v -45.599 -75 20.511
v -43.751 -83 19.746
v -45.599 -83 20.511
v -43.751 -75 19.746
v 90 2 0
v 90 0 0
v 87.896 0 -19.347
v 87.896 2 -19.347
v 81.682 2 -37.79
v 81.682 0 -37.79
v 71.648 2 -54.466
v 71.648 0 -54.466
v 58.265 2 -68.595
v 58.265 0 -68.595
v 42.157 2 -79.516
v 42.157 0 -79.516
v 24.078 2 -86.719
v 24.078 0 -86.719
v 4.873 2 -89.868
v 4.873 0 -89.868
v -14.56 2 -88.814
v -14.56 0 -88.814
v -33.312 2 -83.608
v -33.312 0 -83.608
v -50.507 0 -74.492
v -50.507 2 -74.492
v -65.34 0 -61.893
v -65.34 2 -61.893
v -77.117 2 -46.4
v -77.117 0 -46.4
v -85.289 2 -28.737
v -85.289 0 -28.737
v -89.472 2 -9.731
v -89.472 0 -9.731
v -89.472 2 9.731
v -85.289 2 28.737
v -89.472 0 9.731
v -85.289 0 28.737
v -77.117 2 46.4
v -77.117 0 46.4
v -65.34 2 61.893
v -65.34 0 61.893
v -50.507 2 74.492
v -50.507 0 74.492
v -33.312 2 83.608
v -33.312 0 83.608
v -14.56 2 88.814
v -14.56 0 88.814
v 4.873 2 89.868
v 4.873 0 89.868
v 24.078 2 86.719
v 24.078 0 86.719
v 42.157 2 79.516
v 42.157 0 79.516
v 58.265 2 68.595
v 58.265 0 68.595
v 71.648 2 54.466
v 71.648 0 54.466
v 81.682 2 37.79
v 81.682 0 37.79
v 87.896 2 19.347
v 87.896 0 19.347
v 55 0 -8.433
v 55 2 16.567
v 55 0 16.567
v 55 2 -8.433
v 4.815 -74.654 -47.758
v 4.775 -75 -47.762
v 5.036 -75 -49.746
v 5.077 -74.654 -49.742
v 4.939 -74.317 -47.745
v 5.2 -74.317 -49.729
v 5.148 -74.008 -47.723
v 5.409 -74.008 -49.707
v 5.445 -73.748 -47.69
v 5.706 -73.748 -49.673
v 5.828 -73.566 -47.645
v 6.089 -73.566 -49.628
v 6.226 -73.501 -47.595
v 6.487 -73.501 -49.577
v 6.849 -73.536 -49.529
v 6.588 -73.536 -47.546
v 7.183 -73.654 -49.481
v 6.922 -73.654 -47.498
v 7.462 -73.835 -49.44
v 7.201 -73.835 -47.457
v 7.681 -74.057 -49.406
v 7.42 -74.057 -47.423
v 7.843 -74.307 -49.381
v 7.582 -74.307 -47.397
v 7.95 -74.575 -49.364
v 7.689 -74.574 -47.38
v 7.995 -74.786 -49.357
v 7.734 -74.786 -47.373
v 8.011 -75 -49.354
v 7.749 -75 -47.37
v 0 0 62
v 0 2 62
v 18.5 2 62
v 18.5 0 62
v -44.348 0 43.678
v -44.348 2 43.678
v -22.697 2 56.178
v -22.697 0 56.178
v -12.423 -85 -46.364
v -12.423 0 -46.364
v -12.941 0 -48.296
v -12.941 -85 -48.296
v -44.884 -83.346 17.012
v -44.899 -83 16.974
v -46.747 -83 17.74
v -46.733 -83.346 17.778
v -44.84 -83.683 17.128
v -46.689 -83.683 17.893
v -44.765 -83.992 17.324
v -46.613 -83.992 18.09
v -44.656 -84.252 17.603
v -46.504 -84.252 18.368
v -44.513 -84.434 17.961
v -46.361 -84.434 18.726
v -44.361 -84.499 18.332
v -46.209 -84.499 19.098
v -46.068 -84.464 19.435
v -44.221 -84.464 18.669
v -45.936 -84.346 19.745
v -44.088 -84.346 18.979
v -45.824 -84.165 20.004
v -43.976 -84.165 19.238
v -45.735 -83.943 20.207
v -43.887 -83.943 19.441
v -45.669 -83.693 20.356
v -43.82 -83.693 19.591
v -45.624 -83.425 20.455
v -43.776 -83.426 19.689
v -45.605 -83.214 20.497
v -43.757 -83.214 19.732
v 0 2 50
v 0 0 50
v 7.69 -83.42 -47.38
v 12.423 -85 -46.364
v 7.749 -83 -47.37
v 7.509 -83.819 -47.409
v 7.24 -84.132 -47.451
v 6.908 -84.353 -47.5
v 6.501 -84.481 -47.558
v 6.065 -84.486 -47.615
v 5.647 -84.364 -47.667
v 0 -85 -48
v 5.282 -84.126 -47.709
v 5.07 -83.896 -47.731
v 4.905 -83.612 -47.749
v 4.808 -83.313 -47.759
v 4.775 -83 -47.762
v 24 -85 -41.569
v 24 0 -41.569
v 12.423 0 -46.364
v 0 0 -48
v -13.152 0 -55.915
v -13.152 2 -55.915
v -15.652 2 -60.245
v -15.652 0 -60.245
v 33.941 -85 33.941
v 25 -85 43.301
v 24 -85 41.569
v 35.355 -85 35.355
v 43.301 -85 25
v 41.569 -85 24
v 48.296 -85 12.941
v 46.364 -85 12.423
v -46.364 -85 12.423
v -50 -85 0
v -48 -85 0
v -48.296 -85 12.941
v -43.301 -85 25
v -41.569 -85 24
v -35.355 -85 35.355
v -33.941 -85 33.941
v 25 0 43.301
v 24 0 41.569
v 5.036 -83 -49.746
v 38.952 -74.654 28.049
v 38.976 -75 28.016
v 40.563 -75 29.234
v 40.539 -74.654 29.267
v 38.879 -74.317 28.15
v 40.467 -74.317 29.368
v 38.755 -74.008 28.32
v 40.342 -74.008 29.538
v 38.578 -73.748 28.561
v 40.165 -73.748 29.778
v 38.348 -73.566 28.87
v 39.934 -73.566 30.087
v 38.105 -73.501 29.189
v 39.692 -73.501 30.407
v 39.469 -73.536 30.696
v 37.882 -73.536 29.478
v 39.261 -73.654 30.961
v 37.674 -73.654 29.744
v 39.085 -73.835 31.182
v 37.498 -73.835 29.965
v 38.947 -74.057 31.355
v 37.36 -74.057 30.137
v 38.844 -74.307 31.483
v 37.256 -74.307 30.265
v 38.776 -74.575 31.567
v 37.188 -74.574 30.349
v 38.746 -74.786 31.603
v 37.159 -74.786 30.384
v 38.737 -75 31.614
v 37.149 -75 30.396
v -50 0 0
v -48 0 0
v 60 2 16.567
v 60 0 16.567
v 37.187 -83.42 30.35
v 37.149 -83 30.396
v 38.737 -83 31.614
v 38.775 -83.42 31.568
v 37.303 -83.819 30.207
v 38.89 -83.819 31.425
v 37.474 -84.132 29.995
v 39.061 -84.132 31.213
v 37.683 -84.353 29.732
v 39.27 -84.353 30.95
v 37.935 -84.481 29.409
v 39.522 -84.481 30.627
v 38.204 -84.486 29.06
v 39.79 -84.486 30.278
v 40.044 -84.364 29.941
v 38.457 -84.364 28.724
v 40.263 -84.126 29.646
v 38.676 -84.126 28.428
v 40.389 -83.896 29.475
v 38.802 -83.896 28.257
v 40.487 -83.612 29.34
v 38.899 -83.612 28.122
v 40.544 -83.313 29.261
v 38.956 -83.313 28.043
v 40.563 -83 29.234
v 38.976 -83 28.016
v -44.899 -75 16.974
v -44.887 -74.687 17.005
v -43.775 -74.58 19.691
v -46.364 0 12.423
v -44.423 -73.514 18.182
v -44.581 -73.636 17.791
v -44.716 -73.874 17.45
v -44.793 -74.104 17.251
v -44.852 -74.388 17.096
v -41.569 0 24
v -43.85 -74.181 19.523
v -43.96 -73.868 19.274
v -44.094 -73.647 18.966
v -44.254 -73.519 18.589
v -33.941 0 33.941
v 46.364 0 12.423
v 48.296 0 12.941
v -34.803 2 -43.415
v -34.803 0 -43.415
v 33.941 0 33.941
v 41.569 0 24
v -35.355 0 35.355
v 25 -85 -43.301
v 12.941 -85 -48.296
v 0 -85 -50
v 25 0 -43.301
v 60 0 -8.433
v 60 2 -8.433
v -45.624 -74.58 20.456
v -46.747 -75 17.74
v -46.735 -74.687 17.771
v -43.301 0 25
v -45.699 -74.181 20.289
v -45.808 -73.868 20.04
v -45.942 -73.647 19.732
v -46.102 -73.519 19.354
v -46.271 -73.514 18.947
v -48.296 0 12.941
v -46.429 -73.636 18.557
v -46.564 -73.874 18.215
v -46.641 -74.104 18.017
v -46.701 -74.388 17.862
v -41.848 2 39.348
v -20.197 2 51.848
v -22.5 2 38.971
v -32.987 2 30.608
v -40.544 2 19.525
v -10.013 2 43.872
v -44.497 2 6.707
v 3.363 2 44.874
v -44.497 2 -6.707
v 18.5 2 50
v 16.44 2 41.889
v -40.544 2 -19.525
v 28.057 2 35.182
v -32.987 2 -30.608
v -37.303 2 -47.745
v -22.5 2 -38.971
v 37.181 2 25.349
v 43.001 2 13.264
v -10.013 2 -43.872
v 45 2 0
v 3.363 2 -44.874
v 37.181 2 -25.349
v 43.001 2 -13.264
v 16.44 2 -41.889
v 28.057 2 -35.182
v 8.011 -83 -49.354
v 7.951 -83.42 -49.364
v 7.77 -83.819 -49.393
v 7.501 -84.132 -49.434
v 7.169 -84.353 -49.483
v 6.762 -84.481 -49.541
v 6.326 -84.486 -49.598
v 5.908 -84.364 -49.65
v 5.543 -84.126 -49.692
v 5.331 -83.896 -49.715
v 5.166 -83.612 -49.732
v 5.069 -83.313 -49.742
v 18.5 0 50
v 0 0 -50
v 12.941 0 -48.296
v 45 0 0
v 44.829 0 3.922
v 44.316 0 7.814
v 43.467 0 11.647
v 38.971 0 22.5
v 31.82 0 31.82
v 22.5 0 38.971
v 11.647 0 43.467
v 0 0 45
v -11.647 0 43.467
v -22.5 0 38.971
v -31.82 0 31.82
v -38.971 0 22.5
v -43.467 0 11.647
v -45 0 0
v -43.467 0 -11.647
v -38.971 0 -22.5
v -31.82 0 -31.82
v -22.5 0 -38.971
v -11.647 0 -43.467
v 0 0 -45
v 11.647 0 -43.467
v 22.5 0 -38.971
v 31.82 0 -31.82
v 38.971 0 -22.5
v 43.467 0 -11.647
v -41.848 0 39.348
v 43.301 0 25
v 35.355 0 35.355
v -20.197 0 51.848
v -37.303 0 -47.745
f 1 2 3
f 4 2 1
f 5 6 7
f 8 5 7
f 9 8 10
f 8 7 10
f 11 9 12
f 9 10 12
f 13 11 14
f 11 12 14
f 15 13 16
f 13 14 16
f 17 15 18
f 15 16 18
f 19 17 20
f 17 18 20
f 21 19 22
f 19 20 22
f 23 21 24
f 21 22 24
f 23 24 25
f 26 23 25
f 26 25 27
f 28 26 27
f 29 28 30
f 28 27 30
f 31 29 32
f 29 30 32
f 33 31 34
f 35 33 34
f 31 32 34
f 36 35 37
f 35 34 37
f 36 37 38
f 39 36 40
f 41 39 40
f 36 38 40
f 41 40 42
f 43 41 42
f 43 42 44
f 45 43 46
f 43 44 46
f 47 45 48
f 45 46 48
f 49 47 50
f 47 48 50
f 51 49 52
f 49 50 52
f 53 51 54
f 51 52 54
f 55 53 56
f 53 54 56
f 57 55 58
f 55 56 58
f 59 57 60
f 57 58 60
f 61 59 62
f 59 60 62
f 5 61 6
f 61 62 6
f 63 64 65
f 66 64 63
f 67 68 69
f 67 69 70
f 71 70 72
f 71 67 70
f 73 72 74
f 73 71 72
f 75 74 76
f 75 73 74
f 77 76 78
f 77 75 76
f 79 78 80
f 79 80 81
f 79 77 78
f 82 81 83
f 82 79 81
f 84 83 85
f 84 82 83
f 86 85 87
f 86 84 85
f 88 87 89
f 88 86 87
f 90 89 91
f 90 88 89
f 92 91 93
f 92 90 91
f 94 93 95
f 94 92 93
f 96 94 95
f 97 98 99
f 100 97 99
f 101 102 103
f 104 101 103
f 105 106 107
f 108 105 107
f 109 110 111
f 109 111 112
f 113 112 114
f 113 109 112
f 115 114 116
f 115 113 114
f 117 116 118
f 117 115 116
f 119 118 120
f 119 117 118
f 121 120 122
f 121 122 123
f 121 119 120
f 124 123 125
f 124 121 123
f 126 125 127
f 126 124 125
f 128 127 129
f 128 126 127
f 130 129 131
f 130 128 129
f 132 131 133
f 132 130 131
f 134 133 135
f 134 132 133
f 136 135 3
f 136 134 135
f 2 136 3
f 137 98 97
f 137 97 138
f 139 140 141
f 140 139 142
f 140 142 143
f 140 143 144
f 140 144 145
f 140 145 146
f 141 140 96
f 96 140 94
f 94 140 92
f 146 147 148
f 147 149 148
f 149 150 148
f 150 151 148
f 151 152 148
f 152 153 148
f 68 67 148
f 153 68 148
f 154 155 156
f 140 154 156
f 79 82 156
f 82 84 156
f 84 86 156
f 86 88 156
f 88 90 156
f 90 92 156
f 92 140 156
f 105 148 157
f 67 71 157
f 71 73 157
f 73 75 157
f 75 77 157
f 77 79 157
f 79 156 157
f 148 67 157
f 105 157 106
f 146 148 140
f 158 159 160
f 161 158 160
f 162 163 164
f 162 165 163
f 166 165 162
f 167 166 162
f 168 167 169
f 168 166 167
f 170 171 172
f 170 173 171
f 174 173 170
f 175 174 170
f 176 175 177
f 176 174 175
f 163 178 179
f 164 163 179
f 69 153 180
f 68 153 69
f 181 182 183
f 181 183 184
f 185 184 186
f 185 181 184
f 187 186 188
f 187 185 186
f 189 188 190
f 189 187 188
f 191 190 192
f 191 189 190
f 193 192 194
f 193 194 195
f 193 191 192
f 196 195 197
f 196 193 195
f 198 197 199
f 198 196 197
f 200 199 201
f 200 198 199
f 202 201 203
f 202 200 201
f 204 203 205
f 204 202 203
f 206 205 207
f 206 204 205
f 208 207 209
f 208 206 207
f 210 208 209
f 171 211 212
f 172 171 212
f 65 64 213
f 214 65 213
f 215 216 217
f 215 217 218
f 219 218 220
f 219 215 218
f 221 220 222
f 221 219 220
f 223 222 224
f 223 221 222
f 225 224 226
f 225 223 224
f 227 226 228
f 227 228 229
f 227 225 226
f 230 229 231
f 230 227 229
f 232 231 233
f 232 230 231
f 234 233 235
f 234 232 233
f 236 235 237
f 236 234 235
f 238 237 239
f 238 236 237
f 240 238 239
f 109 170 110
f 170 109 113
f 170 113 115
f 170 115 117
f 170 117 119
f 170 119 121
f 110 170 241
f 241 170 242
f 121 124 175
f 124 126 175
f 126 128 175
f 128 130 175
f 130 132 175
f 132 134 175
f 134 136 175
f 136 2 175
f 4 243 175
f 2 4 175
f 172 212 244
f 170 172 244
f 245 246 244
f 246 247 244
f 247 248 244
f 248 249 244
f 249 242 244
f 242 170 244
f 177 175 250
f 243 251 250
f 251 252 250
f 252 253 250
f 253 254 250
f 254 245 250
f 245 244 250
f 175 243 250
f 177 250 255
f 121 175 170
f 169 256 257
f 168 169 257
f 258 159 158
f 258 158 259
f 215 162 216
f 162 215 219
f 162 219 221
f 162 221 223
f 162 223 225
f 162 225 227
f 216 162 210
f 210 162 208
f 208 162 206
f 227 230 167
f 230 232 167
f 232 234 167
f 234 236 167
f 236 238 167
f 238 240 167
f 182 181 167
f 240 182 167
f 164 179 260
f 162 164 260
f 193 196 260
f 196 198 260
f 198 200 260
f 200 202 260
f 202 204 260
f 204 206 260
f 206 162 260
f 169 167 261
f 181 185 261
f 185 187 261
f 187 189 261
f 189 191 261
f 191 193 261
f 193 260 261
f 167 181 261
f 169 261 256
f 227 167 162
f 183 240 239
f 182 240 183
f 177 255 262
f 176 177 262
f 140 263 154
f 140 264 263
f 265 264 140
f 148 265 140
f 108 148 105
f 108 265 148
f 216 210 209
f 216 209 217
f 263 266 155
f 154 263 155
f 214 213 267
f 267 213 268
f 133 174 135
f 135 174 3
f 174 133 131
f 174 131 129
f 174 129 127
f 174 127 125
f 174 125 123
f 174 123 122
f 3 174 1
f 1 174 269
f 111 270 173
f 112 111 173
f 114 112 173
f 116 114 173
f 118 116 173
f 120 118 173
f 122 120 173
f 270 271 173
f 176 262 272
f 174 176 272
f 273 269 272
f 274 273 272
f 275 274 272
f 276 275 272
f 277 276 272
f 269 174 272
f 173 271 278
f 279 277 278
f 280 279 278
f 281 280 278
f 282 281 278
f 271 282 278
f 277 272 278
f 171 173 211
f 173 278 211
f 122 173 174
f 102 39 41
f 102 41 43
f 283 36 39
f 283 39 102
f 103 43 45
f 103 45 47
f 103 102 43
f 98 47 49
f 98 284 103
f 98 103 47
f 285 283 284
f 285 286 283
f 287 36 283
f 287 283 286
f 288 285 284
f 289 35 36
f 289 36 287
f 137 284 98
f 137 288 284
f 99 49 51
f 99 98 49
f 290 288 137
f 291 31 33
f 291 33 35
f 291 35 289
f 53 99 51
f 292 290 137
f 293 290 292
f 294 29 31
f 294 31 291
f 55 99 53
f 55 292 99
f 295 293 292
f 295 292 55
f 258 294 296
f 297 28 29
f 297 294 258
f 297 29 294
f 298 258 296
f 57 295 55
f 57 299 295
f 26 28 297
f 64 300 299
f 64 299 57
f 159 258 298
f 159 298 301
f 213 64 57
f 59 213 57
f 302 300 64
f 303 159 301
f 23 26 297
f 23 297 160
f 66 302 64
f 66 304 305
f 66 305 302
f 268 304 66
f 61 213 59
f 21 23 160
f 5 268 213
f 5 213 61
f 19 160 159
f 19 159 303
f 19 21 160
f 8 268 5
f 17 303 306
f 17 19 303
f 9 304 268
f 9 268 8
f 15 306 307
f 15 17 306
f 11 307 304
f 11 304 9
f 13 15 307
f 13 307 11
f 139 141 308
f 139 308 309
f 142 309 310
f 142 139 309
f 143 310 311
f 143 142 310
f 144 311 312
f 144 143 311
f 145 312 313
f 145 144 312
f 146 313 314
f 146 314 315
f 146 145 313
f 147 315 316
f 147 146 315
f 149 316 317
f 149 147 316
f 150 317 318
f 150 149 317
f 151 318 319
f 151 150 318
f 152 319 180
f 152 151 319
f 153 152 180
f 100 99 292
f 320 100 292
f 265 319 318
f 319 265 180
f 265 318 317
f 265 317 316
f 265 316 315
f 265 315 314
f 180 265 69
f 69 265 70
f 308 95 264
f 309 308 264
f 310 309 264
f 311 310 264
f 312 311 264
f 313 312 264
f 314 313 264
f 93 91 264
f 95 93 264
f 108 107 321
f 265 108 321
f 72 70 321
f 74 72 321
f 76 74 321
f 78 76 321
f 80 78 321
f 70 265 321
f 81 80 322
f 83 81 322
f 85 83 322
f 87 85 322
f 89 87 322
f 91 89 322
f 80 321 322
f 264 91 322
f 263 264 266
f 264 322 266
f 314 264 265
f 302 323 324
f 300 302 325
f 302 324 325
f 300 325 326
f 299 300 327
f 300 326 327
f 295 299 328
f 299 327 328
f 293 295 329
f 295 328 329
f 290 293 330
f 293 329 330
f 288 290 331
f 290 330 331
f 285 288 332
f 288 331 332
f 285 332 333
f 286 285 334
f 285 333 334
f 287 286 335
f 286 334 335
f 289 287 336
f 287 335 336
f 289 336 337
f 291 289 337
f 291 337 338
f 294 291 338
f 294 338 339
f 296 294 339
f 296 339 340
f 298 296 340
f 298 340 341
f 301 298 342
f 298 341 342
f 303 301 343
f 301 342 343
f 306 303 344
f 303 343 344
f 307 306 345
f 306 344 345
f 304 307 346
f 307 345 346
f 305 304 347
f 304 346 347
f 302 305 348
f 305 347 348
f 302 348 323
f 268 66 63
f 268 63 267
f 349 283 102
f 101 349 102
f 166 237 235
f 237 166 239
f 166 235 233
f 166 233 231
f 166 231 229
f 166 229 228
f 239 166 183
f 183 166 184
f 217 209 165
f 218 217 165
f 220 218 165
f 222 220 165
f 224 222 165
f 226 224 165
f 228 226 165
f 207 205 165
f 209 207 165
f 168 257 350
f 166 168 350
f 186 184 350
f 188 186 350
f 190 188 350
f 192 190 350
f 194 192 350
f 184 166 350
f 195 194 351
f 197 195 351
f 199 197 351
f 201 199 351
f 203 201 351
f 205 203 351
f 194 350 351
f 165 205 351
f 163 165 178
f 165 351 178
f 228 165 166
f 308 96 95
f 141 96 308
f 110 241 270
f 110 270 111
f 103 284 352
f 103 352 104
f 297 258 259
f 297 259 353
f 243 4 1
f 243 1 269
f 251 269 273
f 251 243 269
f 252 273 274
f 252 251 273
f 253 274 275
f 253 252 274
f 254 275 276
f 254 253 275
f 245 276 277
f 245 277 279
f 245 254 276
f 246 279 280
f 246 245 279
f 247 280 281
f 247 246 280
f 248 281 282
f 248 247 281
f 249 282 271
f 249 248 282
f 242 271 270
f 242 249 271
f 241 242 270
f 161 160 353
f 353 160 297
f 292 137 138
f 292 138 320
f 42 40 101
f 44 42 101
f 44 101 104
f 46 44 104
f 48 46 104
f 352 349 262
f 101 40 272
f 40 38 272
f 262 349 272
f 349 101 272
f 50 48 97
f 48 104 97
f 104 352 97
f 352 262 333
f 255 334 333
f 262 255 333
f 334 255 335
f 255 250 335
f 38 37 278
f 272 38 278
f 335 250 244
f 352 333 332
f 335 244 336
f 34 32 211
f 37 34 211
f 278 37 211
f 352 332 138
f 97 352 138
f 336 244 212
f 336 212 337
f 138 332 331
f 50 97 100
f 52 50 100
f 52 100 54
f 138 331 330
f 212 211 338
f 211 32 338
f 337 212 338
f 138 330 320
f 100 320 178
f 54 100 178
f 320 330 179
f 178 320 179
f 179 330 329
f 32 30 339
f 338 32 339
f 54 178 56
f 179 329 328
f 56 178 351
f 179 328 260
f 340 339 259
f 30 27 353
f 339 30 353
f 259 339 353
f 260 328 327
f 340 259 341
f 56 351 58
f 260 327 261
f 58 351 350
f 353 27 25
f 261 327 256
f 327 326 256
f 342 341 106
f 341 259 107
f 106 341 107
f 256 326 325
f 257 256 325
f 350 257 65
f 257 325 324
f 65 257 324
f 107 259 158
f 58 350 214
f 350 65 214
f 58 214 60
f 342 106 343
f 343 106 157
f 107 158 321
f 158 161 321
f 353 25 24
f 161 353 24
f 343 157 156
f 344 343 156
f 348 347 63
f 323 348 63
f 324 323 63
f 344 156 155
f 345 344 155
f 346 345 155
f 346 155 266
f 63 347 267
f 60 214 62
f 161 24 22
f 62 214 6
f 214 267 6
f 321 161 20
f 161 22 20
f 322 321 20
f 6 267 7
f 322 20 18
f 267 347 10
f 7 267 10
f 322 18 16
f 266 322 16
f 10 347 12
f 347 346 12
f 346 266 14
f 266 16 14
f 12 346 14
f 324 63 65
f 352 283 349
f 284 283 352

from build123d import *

# Parameters (mm, degrees)
SKETCH3_R           = 90
BOSS_EXTRUDE3_DEPTH = 2
SKETCH4_R           = 45
CUT_EXTRUDE1_DEPTH  = 2
BOSS_EXTRUDE4_DEPTH = 85
BOSS_EXTRUDE5_DEPTH = 85
CUT_EXTRUDE9_DEPTH  = 10
CIRPATTERN4_COUNT   = 3
CUT_EXTRUDE5_DEPTH  = 60
SKETCH15_W          = 5
SKETCH15_H          = 25
CUT_EXTRUDE10_DEPTH = 88.0000001
CIRPATTERN5_COUNT   = 3
SKETCH16_R          = 46
CUT_EXTRUDE11_DEPTH = 85
BOSS_EXTRUDE6_DEPTH = 2
SKETCH18_W          = 18.5
SKETCH18_H          = 12
CUT_EXTRUDE12_DEPTH = 2


with BuildPart() as part:
    # Sketch3 → Boss-Extrude3 (new body)
    with BuildSketch(Plane(origin=(0, 0, 0), x_dir=(1, 0, 0), z_dir=(0, 1, 0))):
        Circle(SKETCH3_R)
    extrude(amount=BOSS_EXTRUDE3_DEPTH)

    # Sketch4 → Cut-Extrude1 (cut)
    with BuildSketch(Plane.XZ):
        Circle(SKETCH4_R)
    extrude(amount=-CUT_EXTRUDE1_DEPTH, mode=Mode.SUBTRACT)

    # Sketch6 → Boss-Extrude4 (add)
    with BuildSketch(Plane.XZ):
        with BuildLine():
            Line((-46, 0), (-45, 0))
            ThreePointArc((-45, 0), (-41.574578963, 17.220754456), (-31.819805153, 31.819805153))
            Line((-31.819805153, 31.819805153), (-32.526911935, 32.526911935))
            ThreePointArc((-32.526911935, 32.526911935), (-42.498458496, 17.603437889), (-46, 0))
        make_face()
    boss_extrude4 = extrude(amount=BOSS_EXTRUDE4_DEPTH)

    # Sketch6<3> → Boss-Extrude5 (add)
    with BuildSketch(Plane.XZ):
        with BuildLine():
            Line((-50, 0), (-48, 0))
            ThreePointArc((-48, 0), (-44.346217561, 18.368804754), (-33.941125497, 33.941125497))
            Line((-33.941125497, 33.941125497), (-35.355339059, 35.355339059))
            ThreePointArc((-35.355339059, 35.355339059), (-46.193976626, 19.134171618), (-50, 0))
        make_face()
    boss_extrude5 = extrude(amount=BOSS_EXTRUDE5_DEPTH)

    # Sketch14 → Cut-Extrude9 (cut)
    with BuildSketch(Plane(origin=(-38.409902577, 0, 15.909902577), x_dir=(-0.382683432, 0, -0.923879533), z_dir=(0.923879533, 0, -0.382683432))):
        with BuildLine():
            Line((1.5, -75), (1.5, -83))
            ThreePointArc((1.5, -83), (0, -84.5), (-1.5, -83))
            Line((-1.5, -83), (-1.5, -75))
            ThreePointArc((-1.5, -75), (0, -73.5), (1.5, -75))
        make_face()
    cut_extrude9 = extrude(amount=-CUT_EXTRUDE9_DEPTH, mode=Mode.SUBTRACT)

    # CirPattern4: Boss-Extrude4, Boss-Extrude5, Cut-Extrude9 ×3 about axis
    cirpattern4_axis = Axis((0, 0, 0), (0, 1, 0))
    for i in range(1, CIRPATTERN4_COUNT):
        add(boss_extrude4.rotate(cirpattern4_axis, i * 360 / CIRPATTERN4_COUNT))
        add(boss_extrude5.rotate(cirpattern4_axis, i * 360 / CIRPATTERN4_COUNT))
        add(cut_extrude9.rotate(cirpattern4_axis, i * 360 / CIRPATTERN4_COUNT), mode=Mode.SUBTRACT)

    # Sketch11 → Cut-Extrude5 (cut, symmetric)
    with BuildSketch(Plane.XZ):
        Polygon((-6.747570404, -52.479477871), (11.40662685, -48.919264104), (13.715954699, -60.69495962), (-4.438242555, -64.255173387), align=None)
    extrude(amount=CUT_EXTRUDE5_DEPTH, both=True, mode=Mode.SUBTRACT)

    # Sketch15 → Cut-Extrude10 (cut, through all)
    with BuildSketch(Plane(origin=(0, 2, 0), x_dir=(1, 0, 0), z_dir=(0, 1, 0))):
        with Locations((57.5, -4.067185812)):
            Rectangle(SKETCH15_W, SKETCH15_H)
    cut_extrude10 = extrude(amount=-CUT_EXTRUDE10_DEPTH, mode=Mode.SUBTRACT)

    # CirPattern5: Cut-Extrude10 ×3 about axis
    cirpattern5_axis = Axis((0, 0, 0), (0, 1, 0))
    for i in range(1, CIRPATTERN5_COUNT):
        add(cut_extrude10.rotate(cirpattern5_axis, i * 360 / CIRPATTERN5_COUNT), mode=Mode.SUBTRACT)

    # Sketch16 → Cut-Extrude11 (cut)
    with BuildSketch(Plane.XZ.offset(85)):
        Circle(SKETCH16_R)
    extrude(amount=-CUT_EXTRUDE11_DEPTH, mode=Mode.SUBTRACT)

    # Sketch17 → Boss-Extrude6 (add)
    with BuildSketch(Plane(origin=(0, 2, 0), x_dir=(1, 0, 0), z_dir=(0, 1, 0))):
        Polygon((13.715954699, 60.69495962), (-4.438242555, 64.255173387), (-6.747570404, 52.479477871), (11.40662685, 48.919264104), align=None)
    extrude(amount=-BOSS_EXTRUDE6_DEPTH)

    # Sketch18 → Cut-Extrude12 (cut)
    with BuildSketch(Plane(origin=(0, 2, 0), x_dir=(1, 0, 0), z_dir=(0, 1, 0))):
        with Locations((9.25, -56)):
            Rectangle(SKETCH18_W, SKETCH18_H)
    extrude(amount=-CUT_EXTRUDE12_DEPTH, mode=Mode.SUBTRACT)


solid = part.part
